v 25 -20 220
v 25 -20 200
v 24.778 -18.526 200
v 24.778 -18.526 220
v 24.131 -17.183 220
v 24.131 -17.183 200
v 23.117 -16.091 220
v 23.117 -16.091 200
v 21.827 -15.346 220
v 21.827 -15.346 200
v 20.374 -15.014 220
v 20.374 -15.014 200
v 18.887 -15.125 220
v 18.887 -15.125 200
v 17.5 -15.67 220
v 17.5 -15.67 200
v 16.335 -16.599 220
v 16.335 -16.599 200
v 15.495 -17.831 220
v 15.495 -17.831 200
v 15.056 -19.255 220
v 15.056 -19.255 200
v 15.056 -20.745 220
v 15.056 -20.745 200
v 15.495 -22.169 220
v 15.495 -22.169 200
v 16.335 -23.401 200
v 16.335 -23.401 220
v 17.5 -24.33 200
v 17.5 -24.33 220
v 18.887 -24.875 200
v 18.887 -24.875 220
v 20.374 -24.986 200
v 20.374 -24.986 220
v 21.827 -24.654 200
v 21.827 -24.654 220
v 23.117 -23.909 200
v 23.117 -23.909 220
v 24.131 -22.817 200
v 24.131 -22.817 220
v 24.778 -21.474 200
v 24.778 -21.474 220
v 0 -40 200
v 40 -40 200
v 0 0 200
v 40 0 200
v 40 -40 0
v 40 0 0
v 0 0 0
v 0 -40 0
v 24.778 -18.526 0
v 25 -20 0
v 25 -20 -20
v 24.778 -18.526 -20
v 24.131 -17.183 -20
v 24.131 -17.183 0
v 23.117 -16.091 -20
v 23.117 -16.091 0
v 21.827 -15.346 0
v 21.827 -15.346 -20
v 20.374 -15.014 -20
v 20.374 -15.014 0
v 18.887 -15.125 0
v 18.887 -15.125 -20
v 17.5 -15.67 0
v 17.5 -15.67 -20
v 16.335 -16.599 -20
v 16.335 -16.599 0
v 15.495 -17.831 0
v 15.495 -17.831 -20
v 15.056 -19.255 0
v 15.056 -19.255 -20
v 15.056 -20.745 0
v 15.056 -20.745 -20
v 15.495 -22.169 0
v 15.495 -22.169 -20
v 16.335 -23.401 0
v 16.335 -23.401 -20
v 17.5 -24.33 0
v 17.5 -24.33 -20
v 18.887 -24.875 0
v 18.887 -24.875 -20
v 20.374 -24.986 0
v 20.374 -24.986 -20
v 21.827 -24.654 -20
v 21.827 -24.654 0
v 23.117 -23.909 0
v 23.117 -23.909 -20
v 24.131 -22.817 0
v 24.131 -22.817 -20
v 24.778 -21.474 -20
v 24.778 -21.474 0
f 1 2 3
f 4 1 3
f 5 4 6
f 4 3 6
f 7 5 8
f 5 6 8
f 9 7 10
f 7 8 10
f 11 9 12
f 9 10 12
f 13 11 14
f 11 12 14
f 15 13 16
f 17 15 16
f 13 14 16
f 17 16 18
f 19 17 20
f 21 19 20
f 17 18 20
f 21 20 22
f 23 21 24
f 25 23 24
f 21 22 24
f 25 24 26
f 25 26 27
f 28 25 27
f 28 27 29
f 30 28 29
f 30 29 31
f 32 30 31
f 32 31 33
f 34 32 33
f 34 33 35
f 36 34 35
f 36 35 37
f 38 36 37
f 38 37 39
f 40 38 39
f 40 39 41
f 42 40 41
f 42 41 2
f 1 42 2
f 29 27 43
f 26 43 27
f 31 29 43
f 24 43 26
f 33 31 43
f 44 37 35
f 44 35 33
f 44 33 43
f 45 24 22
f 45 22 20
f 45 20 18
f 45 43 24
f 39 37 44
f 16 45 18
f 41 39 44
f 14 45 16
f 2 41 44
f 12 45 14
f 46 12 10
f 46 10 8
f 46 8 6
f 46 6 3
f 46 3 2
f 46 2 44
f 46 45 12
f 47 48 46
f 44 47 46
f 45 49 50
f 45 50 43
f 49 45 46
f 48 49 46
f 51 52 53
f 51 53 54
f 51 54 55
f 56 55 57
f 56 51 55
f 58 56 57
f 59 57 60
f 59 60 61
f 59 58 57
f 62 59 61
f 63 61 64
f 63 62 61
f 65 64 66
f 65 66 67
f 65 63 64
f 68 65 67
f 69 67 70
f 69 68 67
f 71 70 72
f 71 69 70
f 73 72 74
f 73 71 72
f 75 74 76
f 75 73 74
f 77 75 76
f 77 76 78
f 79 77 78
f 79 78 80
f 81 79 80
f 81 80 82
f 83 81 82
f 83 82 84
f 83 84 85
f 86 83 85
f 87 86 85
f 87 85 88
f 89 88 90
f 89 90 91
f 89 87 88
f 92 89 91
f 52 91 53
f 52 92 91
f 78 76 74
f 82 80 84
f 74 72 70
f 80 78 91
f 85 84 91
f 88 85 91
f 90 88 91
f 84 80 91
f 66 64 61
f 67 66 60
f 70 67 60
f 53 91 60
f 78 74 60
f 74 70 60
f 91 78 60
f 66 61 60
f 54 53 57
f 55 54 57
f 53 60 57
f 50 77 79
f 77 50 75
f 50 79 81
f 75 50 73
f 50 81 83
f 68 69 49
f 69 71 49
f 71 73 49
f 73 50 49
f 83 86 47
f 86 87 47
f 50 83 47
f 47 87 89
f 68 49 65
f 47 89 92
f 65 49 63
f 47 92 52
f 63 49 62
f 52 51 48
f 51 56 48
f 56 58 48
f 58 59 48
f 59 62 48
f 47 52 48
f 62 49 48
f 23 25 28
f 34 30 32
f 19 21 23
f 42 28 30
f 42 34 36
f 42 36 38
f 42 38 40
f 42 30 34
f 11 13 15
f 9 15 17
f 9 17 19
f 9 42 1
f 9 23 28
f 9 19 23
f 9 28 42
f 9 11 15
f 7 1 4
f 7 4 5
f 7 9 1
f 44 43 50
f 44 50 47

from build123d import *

# Parameters (mm, degrees)
SKETCH_W     = 40
SKETCH_H     = 200
PAD_DEPTH    = 40
SKETCH001_R  = 5
PAD001_DEPTH = 20
PAD002_DEPTH = 220


with BuildPart() as part:
    # Sketch → Pad (new body)
    with BuildSketch(Plane.XZ):
        with Locations((20, 100)):
            Rectangle(SKETCH_W, SKETCH_H)
    extrude(amount=PAD_DEPTH)

    # Sketch001 → Pad001 (join)
    with BuildSketch(Plane.XY):
        with Locations((20, -20)):
            Circle(SKETCH001_R)
    extrude(amount=-PAD001_DEPTH)

    # Sketch001 → Pad002 (join)
    with BuildSketch(Plane.XY):
        with Locations((20, -20)):
            Circle(SKETCH001_R)
    extrude(amount=PAD002_DEPTH)


solid = part.part
